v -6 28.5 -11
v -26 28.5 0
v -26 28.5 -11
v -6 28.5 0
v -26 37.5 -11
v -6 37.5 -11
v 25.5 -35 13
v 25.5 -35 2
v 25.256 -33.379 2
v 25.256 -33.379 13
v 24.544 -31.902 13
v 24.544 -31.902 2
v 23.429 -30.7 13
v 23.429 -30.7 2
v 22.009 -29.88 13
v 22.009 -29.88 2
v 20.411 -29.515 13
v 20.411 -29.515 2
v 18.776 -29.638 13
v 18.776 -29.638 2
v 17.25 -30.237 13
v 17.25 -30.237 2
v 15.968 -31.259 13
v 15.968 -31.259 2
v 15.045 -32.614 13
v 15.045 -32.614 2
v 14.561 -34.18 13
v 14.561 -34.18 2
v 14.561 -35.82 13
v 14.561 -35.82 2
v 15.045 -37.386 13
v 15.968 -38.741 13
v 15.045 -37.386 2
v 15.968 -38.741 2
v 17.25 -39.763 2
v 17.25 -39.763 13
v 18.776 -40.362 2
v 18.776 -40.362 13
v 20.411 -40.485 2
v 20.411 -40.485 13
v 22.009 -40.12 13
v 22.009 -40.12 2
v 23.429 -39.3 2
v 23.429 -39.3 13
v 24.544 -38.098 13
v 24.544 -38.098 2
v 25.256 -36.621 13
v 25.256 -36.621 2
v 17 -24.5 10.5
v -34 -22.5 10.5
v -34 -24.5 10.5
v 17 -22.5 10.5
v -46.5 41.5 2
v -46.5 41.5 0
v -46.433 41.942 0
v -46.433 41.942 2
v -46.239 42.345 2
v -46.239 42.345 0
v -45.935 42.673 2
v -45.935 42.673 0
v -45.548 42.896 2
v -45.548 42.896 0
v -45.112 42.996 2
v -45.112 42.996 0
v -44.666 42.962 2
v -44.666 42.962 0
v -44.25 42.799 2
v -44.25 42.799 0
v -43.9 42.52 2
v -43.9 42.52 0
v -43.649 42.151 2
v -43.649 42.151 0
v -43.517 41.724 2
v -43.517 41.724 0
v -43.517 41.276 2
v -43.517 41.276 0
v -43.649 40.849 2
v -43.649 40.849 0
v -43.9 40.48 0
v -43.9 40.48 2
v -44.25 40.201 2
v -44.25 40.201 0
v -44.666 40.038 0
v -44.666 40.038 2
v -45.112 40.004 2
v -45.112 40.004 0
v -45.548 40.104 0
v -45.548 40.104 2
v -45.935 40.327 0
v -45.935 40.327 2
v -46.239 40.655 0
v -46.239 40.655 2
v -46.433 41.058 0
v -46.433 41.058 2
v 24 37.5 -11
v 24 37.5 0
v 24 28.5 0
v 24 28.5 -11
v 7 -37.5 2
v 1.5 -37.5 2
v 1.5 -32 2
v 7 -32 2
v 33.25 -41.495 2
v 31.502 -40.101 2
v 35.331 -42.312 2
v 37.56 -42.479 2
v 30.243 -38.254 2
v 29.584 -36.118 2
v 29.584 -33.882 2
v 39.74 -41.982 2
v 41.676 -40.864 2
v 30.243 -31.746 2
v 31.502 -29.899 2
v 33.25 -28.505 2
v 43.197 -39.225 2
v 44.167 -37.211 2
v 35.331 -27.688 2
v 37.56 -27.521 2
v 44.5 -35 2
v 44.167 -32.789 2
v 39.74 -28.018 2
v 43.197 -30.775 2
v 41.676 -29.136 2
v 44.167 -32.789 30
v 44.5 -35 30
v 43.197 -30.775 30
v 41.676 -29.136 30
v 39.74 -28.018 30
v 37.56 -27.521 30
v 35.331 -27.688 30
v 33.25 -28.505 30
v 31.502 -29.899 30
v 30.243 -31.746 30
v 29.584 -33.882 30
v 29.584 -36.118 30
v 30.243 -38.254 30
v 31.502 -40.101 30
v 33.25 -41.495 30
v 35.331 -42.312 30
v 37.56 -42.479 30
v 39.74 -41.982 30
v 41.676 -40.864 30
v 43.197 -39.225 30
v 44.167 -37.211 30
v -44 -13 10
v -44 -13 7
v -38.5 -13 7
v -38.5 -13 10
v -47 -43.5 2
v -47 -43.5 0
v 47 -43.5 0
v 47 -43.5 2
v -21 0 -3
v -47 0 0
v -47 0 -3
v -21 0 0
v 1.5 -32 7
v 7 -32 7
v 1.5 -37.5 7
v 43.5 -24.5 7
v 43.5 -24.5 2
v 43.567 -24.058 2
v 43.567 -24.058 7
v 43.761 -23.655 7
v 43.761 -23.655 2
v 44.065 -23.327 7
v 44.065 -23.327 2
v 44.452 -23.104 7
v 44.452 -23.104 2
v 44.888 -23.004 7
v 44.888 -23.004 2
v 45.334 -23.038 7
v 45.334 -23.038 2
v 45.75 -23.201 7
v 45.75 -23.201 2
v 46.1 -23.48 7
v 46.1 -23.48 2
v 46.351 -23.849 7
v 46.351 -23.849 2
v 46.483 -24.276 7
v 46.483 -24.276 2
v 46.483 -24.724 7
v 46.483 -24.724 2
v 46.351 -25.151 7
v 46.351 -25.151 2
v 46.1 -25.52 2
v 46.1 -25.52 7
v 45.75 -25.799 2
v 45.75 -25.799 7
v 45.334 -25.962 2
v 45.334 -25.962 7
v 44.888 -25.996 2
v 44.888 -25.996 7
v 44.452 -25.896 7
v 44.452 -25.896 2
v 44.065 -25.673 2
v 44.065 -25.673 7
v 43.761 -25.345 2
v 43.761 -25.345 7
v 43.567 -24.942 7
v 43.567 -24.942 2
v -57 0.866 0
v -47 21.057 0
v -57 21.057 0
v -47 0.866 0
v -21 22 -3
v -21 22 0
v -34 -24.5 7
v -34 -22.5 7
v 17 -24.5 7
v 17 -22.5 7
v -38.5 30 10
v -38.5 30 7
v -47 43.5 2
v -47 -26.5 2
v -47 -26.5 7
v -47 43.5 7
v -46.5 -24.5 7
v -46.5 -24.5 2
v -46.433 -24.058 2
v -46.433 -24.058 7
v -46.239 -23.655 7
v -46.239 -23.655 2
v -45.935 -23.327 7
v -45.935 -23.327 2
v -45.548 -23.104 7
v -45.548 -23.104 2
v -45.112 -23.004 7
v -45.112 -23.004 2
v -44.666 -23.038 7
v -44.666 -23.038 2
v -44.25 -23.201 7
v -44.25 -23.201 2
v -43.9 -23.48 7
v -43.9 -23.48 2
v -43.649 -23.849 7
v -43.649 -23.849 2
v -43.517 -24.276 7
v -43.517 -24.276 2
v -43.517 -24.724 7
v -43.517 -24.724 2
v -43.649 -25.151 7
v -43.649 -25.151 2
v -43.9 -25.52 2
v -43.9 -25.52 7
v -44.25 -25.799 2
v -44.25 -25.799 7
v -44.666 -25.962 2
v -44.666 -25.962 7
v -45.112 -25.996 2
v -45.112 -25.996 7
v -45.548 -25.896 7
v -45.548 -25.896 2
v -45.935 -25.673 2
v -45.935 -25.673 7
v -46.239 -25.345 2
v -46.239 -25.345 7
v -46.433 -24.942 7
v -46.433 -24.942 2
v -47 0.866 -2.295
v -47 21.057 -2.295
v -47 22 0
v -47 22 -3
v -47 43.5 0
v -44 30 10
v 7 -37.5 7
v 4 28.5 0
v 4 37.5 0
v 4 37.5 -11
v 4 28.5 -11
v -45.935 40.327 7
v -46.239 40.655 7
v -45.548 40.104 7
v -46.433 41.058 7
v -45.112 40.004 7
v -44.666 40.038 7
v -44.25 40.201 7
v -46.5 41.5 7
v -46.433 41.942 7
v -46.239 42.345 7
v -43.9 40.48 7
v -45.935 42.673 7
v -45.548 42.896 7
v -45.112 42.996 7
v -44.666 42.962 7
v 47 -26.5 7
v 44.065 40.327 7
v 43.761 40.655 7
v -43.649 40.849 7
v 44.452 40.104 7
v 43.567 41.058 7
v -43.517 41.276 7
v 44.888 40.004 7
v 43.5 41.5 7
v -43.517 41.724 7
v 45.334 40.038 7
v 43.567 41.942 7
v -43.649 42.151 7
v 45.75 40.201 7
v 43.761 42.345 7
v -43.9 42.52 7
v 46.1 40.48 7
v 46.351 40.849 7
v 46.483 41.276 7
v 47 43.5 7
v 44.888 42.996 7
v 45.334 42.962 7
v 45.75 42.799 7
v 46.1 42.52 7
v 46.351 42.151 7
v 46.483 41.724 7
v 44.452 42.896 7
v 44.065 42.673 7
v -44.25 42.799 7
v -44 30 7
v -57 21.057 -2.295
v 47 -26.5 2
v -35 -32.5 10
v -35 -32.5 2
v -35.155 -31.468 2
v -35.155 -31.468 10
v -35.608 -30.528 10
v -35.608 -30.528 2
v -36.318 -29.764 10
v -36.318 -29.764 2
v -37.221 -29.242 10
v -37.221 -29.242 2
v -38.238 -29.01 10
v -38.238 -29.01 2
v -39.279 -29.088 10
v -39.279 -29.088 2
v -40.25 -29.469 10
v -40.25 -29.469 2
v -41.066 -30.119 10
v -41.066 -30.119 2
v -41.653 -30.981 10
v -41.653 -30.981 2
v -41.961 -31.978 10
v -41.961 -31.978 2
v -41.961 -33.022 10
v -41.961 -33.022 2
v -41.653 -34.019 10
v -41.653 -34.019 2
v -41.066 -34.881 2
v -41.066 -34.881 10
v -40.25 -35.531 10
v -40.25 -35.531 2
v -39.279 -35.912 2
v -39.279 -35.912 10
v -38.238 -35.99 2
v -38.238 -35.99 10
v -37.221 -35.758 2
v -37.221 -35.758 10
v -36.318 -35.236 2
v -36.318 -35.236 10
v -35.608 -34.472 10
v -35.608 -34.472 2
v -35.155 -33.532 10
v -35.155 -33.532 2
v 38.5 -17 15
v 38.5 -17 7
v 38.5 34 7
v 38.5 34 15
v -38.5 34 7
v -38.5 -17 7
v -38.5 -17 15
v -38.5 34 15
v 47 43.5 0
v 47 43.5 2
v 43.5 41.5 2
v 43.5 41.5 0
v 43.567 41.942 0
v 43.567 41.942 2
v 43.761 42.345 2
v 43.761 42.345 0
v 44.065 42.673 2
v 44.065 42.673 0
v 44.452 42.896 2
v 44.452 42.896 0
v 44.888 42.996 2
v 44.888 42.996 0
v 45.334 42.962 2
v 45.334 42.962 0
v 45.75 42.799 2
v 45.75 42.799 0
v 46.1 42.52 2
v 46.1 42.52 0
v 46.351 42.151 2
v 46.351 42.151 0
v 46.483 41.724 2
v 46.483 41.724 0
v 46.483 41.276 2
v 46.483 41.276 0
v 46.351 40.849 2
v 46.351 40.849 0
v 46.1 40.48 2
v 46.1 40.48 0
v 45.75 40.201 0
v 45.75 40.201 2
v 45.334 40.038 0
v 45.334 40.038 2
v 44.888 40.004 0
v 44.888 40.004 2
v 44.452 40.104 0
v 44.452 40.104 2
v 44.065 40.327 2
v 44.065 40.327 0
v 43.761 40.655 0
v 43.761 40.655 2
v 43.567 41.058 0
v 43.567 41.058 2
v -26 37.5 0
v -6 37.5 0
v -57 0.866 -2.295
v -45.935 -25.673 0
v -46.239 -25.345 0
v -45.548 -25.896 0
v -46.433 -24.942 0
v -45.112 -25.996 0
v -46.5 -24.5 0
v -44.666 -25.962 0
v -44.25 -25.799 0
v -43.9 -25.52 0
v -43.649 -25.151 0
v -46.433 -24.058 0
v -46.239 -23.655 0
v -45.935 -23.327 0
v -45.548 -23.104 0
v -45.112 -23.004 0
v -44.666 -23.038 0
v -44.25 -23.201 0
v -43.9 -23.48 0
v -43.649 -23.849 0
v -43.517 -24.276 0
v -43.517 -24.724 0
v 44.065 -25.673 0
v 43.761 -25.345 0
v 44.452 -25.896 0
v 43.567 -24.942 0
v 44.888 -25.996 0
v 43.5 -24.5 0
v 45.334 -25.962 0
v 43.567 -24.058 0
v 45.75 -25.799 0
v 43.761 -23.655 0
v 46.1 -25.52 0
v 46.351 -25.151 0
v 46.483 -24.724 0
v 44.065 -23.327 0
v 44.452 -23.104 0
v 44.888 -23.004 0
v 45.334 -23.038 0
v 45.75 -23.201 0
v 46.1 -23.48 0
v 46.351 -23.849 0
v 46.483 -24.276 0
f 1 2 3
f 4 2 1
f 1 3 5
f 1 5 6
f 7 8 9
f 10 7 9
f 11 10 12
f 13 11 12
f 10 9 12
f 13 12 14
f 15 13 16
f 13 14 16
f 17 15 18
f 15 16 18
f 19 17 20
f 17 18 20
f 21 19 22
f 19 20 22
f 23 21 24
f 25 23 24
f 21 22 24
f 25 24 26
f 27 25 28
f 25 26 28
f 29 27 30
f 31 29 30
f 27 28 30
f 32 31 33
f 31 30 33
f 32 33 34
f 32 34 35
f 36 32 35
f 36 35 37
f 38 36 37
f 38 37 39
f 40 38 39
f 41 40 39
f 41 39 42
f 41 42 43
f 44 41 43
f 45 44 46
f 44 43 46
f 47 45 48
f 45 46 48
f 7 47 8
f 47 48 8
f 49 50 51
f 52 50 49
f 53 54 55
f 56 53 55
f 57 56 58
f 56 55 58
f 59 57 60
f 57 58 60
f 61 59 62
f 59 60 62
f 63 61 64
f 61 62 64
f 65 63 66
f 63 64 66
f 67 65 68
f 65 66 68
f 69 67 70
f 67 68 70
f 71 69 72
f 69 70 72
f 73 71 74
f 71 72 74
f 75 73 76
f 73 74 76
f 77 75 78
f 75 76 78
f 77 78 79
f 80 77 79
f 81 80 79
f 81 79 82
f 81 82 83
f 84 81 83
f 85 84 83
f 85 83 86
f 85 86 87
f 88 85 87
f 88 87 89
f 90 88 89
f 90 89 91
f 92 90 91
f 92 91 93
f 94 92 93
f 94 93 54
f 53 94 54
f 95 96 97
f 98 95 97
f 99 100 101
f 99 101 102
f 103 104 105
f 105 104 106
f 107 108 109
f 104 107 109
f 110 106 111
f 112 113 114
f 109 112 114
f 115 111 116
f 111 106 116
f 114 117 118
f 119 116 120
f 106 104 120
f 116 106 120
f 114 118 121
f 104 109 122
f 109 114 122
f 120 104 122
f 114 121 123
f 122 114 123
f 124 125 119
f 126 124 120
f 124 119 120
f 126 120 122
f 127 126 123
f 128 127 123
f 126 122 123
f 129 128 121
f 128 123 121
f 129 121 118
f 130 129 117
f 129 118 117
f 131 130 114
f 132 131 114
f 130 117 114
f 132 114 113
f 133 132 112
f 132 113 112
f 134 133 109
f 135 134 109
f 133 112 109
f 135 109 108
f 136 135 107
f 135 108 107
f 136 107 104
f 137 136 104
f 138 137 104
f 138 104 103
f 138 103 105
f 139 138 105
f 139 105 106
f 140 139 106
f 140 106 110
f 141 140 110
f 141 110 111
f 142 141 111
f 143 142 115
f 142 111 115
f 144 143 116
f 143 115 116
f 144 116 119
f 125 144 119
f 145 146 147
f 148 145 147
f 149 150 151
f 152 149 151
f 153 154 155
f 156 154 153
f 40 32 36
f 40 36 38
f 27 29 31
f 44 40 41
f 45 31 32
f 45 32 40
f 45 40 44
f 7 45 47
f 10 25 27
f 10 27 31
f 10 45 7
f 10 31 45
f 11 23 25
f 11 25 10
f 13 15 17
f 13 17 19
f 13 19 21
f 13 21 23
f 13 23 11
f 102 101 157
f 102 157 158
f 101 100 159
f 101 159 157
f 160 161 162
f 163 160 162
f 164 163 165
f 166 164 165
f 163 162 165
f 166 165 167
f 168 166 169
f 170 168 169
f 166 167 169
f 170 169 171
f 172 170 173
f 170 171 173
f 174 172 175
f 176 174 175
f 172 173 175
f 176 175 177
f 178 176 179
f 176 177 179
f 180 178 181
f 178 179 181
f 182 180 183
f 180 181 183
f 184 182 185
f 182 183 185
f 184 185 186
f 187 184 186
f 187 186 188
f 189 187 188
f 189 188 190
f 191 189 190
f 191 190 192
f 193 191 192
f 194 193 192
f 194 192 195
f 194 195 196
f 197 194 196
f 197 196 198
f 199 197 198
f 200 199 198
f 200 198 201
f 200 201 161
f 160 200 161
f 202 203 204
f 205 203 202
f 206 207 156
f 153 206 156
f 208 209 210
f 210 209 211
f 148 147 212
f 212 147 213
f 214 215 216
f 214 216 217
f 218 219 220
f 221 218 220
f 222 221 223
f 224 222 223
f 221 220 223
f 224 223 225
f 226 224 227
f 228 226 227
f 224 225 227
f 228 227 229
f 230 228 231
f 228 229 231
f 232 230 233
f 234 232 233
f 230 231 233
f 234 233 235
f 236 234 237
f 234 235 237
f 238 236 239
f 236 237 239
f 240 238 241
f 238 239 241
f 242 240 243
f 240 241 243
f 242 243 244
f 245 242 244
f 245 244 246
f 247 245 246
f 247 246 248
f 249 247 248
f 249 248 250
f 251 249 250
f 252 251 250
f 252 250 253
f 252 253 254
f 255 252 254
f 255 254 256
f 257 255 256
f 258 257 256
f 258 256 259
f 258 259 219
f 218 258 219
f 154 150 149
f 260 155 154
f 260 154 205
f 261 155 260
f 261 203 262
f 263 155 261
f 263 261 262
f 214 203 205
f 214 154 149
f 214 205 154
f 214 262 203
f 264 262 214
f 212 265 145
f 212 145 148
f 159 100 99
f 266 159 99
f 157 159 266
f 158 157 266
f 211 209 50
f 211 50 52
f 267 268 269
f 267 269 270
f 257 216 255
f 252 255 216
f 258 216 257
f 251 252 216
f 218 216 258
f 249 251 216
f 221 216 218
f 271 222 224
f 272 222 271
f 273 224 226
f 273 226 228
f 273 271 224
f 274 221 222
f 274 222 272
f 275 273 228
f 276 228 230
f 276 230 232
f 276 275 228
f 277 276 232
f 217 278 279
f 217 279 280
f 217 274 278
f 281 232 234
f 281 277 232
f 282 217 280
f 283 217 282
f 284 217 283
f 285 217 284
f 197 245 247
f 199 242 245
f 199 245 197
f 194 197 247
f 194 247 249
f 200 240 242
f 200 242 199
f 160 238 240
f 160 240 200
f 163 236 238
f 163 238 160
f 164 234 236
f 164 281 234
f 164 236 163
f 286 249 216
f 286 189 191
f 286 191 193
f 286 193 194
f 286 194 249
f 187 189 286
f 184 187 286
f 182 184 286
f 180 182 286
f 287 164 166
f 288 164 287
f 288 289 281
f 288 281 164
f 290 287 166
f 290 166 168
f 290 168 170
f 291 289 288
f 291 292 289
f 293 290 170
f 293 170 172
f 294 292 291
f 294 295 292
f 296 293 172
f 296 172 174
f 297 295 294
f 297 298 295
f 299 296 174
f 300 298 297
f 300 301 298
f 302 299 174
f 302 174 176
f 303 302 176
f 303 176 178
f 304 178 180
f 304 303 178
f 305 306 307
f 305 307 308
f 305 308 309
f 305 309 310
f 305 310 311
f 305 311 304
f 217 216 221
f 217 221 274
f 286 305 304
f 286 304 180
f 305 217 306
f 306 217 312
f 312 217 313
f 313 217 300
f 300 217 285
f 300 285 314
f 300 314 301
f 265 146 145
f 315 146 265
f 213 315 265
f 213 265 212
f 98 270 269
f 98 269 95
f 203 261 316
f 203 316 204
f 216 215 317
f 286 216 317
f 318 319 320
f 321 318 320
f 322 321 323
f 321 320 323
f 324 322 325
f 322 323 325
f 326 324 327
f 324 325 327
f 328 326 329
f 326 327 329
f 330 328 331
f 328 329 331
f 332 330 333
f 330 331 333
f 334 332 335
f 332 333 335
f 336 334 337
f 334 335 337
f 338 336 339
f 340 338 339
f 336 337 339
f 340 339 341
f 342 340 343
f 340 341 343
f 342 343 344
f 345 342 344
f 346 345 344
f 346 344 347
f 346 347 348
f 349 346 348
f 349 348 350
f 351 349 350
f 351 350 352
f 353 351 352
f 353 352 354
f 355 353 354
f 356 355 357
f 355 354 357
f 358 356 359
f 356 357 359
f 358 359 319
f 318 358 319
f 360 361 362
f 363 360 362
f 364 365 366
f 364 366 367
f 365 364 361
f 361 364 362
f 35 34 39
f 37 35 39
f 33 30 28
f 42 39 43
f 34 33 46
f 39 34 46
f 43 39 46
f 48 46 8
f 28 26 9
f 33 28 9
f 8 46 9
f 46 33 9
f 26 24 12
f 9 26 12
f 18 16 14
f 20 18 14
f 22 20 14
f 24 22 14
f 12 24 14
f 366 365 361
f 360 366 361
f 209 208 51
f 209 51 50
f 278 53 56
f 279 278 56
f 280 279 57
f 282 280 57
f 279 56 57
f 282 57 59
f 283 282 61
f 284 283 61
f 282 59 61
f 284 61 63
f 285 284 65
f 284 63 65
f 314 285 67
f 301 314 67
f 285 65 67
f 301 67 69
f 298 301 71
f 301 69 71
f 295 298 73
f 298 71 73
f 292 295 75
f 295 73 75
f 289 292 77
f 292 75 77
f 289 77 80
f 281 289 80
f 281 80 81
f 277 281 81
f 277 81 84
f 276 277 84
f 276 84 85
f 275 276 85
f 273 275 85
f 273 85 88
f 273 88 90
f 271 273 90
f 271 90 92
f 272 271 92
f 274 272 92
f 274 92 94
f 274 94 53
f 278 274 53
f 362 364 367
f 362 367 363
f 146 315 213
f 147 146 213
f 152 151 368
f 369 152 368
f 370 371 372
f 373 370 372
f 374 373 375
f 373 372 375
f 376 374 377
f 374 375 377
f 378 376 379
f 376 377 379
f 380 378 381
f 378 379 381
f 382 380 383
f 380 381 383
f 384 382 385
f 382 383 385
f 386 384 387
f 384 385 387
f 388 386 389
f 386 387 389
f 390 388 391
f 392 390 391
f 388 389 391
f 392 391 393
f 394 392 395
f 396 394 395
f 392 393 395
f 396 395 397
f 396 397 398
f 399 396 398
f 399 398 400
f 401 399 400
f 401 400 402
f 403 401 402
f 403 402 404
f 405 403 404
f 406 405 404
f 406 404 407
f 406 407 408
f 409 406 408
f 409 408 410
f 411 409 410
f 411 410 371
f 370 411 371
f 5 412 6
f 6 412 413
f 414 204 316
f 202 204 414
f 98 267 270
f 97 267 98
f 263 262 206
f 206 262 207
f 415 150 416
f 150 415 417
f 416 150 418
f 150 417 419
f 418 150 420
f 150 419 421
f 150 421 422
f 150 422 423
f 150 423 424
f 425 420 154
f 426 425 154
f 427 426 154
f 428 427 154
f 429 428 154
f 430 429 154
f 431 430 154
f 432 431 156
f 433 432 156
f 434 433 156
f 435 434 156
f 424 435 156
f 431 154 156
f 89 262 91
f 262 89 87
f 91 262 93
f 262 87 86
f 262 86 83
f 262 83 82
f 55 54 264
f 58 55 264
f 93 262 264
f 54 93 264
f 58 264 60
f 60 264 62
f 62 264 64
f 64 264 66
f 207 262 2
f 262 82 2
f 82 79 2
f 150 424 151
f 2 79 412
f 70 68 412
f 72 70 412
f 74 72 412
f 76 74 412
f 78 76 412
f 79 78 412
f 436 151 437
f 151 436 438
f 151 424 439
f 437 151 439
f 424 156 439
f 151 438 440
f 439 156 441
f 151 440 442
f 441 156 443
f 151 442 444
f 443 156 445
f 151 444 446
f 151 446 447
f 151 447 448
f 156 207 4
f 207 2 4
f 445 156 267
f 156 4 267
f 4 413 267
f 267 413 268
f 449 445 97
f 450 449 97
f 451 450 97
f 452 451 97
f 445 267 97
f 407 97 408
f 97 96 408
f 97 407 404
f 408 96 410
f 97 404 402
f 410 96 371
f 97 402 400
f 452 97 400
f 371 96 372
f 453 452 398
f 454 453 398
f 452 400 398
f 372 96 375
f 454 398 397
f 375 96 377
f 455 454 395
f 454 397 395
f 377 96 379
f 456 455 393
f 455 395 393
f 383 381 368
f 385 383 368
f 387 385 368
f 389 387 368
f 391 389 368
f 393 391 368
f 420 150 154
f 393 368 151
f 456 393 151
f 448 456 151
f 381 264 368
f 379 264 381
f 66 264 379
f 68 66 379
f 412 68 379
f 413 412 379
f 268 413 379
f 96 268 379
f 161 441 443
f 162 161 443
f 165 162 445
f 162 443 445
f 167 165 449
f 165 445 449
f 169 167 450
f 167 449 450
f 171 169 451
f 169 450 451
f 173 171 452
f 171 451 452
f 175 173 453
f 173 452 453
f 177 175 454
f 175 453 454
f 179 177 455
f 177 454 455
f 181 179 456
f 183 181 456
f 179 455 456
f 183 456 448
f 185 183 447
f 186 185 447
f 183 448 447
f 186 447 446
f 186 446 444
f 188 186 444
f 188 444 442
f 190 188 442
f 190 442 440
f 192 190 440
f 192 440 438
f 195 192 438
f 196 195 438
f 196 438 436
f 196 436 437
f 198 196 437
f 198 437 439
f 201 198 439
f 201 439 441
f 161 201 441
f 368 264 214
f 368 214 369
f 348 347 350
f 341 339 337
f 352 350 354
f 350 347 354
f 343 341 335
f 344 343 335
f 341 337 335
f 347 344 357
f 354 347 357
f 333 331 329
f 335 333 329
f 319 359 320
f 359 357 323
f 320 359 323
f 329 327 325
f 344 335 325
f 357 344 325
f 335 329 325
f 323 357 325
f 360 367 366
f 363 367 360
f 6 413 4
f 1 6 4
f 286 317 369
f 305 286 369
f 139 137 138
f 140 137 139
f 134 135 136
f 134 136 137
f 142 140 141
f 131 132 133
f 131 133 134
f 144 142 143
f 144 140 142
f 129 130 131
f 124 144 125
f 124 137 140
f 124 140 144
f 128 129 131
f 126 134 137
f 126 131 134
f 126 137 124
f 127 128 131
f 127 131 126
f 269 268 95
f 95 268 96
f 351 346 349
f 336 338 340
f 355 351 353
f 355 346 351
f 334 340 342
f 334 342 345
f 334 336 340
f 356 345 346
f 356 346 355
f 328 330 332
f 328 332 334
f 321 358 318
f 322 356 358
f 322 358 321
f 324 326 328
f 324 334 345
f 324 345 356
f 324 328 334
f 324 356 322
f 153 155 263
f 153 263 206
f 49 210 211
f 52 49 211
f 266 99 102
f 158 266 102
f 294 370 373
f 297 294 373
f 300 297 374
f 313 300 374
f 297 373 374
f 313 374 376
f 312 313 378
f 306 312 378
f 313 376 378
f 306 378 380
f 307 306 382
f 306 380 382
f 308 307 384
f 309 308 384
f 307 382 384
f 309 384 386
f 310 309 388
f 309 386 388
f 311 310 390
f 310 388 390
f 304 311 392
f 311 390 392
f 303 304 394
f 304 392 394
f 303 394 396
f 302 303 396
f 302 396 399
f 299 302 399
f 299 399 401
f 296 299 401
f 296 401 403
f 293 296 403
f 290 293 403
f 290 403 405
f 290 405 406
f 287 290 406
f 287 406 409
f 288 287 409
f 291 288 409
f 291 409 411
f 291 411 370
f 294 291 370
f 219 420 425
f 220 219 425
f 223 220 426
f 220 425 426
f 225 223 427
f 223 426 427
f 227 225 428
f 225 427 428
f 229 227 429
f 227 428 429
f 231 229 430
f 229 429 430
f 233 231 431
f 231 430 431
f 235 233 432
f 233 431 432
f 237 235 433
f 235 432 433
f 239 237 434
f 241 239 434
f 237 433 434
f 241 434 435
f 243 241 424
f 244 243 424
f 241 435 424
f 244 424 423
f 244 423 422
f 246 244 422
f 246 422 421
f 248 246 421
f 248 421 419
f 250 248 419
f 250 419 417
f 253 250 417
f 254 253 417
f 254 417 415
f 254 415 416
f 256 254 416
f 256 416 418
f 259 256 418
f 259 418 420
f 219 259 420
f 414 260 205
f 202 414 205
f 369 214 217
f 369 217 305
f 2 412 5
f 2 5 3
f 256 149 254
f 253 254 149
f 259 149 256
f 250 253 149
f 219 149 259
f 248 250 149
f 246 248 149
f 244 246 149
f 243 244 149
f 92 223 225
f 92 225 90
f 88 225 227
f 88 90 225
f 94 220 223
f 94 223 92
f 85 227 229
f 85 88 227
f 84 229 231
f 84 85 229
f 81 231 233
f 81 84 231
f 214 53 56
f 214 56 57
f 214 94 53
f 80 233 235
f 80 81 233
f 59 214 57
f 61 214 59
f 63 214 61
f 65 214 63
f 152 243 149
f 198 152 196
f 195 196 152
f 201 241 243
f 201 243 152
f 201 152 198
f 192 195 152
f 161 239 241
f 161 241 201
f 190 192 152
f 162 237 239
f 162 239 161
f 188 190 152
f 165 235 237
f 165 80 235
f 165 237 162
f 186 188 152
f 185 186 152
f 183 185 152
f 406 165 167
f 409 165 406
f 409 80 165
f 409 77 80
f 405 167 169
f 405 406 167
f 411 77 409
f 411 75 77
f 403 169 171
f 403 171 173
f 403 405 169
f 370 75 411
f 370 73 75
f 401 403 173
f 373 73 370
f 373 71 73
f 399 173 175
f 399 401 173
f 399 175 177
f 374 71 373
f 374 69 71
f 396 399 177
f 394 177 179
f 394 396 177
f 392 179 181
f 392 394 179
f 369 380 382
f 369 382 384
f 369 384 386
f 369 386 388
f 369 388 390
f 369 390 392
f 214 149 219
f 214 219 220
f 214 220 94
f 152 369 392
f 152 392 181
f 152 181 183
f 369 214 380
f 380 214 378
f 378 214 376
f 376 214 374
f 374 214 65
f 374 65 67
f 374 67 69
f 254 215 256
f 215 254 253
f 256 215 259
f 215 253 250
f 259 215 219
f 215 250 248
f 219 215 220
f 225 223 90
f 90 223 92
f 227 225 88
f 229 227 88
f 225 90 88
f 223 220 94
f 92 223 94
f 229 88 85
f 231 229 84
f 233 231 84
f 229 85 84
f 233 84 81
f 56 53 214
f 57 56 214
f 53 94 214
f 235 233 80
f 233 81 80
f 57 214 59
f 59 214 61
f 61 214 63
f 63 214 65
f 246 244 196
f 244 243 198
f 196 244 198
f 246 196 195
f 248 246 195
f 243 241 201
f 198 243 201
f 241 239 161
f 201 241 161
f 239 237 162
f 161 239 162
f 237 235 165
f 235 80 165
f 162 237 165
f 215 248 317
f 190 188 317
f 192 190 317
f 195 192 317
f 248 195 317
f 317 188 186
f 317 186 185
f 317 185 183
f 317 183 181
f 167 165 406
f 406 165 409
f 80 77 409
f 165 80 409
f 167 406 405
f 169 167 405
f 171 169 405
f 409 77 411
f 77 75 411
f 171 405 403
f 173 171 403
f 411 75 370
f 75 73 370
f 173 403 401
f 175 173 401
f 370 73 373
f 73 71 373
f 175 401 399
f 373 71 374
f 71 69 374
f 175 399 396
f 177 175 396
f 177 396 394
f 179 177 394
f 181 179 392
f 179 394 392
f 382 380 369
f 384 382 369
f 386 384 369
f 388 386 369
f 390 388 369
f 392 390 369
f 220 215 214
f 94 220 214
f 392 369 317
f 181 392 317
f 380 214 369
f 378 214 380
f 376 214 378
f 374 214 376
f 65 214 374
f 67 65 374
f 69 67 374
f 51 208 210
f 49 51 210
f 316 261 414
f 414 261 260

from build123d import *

# Parameters (mm, degrees)
F0_W        = 94
F0_H        = 87
F1_DEPTH    = 2
F2_W        = 94
F2_H        = 70
F3_DEPTH    = 5
F4_W        = 77
F4_H        = 51
F5_DEPTH    = 8
F6_W        = 5.5
F6_H        = 43
F7_DEPTH    = 3
F8_R        = 7.5
F9_DEPTH    = 28
F10_R       = 5.5
F11_DEPTH   = 11
F12_W       = 5.5
F12_H       = 5.5
F13_DEPTH   = 5
F14_R       = 3.5
F15_DEPTH   = 8
F17_D       = 3
F17_DEPTH   = 20
F17_2_D     = 3
F17_2_DEPTH = 20
F18_D       = 3
F18_2_D     = 3
F19_W       = 51
F19_H       = 2
F20_DEPTH   = 3.5
F21_W       = 26
F21_H       = 22
F22_DEPTH   = 3
F23_W       = 20
F23_H       = 9
F24_DEPTH   = 11
F25_W       = 20.191115
F25_H       = 2.29498
F26_DEPTH   = 10


with BuildPart() as f1:
    # F0 (on Top) → F1 (new body)
    with BuildSketch(Plane.XY):
        Rectangle(F0_W, F0_H)
    extrude(amount=F1_DEPTH)

    # F17
    with Locations(Plane.XY.offset(7)):
        with Locations((-45, 41.5)):
            Hole(F17_D / 2, depth=F17_DEPTH)

    # F18 (through all)
    with Locations(Plane.XY.offset(7)):
        with Locations((45, 41.5), (45, -24.5), (-45, -24.5)):
            Hole(F18_D / 2)

    # F21 (on face) → F22 (join)
    with BuildSketch(Plane(origin=(0, 0, 0), x_dir=(1, 0, 0), z_dir=(0, 0, -1))):
        with Locations((-34, -11)):
            Rectangle(F21_W, F21_H)
    extrude(amount=F22_DEPTH)

    # F23 (on face) → F24 (join)
    with BuildSketch(Plane(origin=(0, 0, 0), x_dir=(1, 0, 0), z_dir=(0, 0, -1))):
        with Locations((14, -33)):
            Rectangle(F23_W, F23_H)
        with Locations((-16, -33)):
            Rectangle(F23_W, F23_H)
    extrude(amount=F24_DEPTH)

    # F25 (on face) → F26 (join)
    with BuildSketch(Plane(origin=(-47, 0, 0), x_dir=(0, -1, 0), z_dir=(-1, 0, 0))):
        with Locations((-10.961359, -1.14749)):
            Rectangle(F25_W, F25_H)
    extrude(amount=F26_DEPTH)


with BuildPart() as f3:
    # F2 (on face) → F3 (new body)
    with BuildSketch(Plane.XY.offset(2)):
        with Locations((0, 8.5)):
            Rectangle(F2_W, F2_H)
    extrude(amount=F3_DEPTH)

    # F17#2
    with Locations(Plane.XY.offset(7)):
        with Locations((-45, 41.5)):
            Hole(F17_2_D / 2, depth=F17_2_DEPTH)

    # F18#2 (through all)
    with Locations(Plane.XY.offset(7)):
        with Locations((45, 41.5), (45, -24.5), (-45, -24.5)):
            Hole(F18_2_D / 2)


with BuildPart() as f5:
    # F4 (on face) → F5 (new body)
    with BuildSketch(Plane.XY.offset(7)):
        with Locations((0, 8.5)):
            Rectangle(F4_W, F4_H)
    extrude(amount=F5_DEPTH)


with BuildPart() as f7:
    # F6 (on face) → F7 (new body)
    with BuildSketch(Plane.XY.offset(7)):
        with Locations((-41.25, 8.5)):
            Rectangle(F6_W, F6_H)
    extrude(amount=F7_DEPTH)


with BuildPart() as f9:
    # F8 (on face) → F9 (new body)
    with BuildSketch(Plane.XY.offset(2)):
        with Locations((37, -35)):
            Circle(F8_R)
    extrude(amount=F9_DEPTH)


with BuildPart() as f11:
    # F10 (on face) → F11 (new body)
    with BuildSketch(Plane.XY.offset(2)):
        with Locations((20, -35)):
            Circle(F10_R)
    extrude(amount=F11_DEPTH)


with BuildPart() as f13:
    # F12 (on face) → F13 (new body)
    with BuildSketch(Plane.XY.offset(2)):
        with Locations((4.25, -34.75)):
            Rectangle(F12_W, F12_H)
    extrude(amount=F13_DEPTH)


with BuildPart() as f15:
    # F14 (on face) → F15 (new body)
    with BuildSketch(Plane.XY.offset(2)):
        with Locations((-38.5, -32.5)):
            Circle(F14_R)
    extrude(amount=F15_DEPTH)


with BuildPart() as f20:
    # F19 (on face) → F20 (new body)
    with BuildSketch(Plane.XY.offset(7)):
        with Locations((-8.5, -23.5)):
            Rectangle(F19_W, F19_H)
    extrude(amount=F20_DEPTH)


solid = Compound([f1.part, f3.part, f5.part, f7.part, f9.part, f11.part, f13.part, f15.part, f20.part])
